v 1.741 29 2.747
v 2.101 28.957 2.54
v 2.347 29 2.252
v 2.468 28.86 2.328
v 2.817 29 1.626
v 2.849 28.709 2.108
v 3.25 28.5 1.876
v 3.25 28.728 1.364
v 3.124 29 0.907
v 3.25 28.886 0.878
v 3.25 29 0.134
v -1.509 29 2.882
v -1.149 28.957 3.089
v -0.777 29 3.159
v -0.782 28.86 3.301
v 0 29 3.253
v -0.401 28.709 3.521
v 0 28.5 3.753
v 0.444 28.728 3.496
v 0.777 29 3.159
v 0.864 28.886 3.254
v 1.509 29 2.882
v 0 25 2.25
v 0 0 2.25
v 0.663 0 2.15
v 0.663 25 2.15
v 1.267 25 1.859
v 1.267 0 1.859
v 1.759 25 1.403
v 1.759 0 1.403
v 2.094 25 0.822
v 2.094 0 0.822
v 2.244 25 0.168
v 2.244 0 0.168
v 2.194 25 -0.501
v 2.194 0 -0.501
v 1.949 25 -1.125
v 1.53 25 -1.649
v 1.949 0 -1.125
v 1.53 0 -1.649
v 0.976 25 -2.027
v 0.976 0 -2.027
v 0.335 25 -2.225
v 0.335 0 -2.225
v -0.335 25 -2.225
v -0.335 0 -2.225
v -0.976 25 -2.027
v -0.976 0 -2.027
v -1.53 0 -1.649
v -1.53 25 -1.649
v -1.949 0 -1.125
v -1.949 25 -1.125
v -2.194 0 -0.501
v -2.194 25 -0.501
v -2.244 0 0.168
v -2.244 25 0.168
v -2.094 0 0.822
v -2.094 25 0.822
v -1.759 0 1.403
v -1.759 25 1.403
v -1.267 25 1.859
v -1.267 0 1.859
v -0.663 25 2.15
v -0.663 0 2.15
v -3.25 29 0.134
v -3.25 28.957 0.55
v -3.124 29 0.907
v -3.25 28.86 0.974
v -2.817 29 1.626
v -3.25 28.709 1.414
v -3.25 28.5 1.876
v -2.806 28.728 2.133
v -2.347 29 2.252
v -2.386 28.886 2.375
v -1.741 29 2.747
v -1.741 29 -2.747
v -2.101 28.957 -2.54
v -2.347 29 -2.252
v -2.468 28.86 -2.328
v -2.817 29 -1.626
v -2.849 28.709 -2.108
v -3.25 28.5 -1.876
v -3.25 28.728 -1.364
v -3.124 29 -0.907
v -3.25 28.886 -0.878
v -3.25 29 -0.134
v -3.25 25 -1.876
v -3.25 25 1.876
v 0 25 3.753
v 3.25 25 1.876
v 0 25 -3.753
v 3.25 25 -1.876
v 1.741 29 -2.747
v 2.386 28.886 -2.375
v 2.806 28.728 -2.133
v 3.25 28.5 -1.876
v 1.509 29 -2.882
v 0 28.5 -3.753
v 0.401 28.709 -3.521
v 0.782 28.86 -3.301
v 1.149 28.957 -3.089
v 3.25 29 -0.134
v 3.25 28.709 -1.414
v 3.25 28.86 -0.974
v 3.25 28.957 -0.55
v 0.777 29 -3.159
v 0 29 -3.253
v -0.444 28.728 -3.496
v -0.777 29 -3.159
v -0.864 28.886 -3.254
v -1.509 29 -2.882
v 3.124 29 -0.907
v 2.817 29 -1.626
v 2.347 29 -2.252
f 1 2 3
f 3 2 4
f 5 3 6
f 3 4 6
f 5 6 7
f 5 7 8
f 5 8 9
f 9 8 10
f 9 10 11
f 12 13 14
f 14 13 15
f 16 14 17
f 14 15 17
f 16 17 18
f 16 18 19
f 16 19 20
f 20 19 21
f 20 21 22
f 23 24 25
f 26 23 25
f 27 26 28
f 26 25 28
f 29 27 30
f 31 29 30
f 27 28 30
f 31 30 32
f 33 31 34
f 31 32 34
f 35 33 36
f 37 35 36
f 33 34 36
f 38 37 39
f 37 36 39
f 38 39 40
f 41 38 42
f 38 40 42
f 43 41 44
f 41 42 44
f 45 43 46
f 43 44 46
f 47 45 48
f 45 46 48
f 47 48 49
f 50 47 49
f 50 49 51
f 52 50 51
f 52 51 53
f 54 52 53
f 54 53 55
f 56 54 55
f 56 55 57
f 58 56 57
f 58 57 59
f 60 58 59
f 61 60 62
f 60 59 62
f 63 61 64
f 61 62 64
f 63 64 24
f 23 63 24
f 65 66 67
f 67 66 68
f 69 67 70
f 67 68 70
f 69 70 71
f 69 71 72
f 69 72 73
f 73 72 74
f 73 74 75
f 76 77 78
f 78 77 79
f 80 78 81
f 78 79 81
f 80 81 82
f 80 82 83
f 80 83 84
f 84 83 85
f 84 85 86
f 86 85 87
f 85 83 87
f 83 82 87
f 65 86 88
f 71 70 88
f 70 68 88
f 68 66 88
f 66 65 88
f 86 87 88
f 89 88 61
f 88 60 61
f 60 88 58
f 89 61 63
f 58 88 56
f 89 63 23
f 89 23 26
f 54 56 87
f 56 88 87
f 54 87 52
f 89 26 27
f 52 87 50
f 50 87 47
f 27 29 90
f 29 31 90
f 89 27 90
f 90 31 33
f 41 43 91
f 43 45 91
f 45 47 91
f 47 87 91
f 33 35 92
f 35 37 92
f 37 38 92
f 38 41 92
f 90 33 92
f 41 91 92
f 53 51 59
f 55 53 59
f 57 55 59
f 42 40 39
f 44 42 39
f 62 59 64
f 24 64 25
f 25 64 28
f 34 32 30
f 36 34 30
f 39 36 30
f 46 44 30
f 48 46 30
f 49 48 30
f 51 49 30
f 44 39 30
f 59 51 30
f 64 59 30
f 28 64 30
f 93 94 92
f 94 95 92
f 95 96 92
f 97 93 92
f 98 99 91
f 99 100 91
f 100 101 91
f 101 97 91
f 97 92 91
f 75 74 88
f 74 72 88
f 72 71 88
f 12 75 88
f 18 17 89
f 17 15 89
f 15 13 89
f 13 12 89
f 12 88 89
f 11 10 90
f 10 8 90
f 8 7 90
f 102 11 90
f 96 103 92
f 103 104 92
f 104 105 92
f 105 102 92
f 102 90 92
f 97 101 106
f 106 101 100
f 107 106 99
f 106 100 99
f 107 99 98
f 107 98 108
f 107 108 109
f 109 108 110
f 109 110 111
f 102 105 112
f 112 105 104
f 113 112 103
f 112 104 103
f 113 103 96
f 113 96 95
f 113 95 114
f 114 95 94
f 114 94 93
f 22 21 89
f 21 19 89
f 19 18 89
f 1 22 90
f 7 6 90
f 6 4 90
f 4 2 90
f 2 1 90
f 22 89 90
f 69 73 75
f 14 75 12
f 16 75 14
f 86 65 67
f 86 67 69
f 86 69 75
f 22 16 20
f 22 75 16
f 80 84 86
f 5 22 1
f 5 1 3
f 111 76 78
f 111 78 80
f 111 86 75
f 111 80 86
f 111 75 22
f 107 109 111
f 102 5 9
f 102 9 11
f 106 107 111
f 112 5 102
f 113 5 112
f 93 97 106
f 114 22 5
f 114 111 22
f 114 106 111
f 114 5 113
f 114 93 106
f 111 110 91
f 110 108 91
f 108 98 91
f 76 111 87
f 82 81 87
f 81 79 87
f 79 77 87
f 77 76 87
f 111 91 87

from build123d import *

# Parameters (mm, degrees)
SKETCH1_R           = 2.25
BOSS_EXTRUDE1_DEPTH = 25
BOSS_EXTRUDE2_DEPTH = 4


with BuildPart() as part:
    # Sketch1 → Boss-Extrude1 (new body)
    with BuildSketch(Plane(origin=(0, 0, 0), x_dir=(1, 0, 0), z_dir=(0, 1, 0))):
        with Locations(Location((0, 0, 0), (0, 0, 270))):
            Circle(SKETCH1_R)
    extrude(amount=BOSS_EXTRUDE1_DEPTH)

    # Sketch2 → Boss-Extrude2 (add)
    with BuildSketch(Plane(origin=(0, 25, 0), x_dir=(1, 0, 0), z_dir=(0, 1, 0))):
        Polygon((-3.25, -1.876388375), (0, -3.75277675), (3.25, -1.876388375), (3.25, 1.876388375), (0, 3.75277675), (-3.25, 1.876388375), align=None)
    extrude(amount=BOSS_EXTRUDE2_DEPTH)

    # Sketch4 → Cut-Revolve1 (revolve, cut)
    with BuildSketch(Plane(origin=(0, 0, 0), x_dir=(0, 0, -1), z_dir=(1, 0, 0))):
        Polygon((3.25277675, 29), (3.75277675, 28.5), (3.75277675, 29), align=None)
    revolve(axis=Axis((0, 0, 0), (0, 1, 0)), mode=Mode.SUBTRACT)


solid = part.part
